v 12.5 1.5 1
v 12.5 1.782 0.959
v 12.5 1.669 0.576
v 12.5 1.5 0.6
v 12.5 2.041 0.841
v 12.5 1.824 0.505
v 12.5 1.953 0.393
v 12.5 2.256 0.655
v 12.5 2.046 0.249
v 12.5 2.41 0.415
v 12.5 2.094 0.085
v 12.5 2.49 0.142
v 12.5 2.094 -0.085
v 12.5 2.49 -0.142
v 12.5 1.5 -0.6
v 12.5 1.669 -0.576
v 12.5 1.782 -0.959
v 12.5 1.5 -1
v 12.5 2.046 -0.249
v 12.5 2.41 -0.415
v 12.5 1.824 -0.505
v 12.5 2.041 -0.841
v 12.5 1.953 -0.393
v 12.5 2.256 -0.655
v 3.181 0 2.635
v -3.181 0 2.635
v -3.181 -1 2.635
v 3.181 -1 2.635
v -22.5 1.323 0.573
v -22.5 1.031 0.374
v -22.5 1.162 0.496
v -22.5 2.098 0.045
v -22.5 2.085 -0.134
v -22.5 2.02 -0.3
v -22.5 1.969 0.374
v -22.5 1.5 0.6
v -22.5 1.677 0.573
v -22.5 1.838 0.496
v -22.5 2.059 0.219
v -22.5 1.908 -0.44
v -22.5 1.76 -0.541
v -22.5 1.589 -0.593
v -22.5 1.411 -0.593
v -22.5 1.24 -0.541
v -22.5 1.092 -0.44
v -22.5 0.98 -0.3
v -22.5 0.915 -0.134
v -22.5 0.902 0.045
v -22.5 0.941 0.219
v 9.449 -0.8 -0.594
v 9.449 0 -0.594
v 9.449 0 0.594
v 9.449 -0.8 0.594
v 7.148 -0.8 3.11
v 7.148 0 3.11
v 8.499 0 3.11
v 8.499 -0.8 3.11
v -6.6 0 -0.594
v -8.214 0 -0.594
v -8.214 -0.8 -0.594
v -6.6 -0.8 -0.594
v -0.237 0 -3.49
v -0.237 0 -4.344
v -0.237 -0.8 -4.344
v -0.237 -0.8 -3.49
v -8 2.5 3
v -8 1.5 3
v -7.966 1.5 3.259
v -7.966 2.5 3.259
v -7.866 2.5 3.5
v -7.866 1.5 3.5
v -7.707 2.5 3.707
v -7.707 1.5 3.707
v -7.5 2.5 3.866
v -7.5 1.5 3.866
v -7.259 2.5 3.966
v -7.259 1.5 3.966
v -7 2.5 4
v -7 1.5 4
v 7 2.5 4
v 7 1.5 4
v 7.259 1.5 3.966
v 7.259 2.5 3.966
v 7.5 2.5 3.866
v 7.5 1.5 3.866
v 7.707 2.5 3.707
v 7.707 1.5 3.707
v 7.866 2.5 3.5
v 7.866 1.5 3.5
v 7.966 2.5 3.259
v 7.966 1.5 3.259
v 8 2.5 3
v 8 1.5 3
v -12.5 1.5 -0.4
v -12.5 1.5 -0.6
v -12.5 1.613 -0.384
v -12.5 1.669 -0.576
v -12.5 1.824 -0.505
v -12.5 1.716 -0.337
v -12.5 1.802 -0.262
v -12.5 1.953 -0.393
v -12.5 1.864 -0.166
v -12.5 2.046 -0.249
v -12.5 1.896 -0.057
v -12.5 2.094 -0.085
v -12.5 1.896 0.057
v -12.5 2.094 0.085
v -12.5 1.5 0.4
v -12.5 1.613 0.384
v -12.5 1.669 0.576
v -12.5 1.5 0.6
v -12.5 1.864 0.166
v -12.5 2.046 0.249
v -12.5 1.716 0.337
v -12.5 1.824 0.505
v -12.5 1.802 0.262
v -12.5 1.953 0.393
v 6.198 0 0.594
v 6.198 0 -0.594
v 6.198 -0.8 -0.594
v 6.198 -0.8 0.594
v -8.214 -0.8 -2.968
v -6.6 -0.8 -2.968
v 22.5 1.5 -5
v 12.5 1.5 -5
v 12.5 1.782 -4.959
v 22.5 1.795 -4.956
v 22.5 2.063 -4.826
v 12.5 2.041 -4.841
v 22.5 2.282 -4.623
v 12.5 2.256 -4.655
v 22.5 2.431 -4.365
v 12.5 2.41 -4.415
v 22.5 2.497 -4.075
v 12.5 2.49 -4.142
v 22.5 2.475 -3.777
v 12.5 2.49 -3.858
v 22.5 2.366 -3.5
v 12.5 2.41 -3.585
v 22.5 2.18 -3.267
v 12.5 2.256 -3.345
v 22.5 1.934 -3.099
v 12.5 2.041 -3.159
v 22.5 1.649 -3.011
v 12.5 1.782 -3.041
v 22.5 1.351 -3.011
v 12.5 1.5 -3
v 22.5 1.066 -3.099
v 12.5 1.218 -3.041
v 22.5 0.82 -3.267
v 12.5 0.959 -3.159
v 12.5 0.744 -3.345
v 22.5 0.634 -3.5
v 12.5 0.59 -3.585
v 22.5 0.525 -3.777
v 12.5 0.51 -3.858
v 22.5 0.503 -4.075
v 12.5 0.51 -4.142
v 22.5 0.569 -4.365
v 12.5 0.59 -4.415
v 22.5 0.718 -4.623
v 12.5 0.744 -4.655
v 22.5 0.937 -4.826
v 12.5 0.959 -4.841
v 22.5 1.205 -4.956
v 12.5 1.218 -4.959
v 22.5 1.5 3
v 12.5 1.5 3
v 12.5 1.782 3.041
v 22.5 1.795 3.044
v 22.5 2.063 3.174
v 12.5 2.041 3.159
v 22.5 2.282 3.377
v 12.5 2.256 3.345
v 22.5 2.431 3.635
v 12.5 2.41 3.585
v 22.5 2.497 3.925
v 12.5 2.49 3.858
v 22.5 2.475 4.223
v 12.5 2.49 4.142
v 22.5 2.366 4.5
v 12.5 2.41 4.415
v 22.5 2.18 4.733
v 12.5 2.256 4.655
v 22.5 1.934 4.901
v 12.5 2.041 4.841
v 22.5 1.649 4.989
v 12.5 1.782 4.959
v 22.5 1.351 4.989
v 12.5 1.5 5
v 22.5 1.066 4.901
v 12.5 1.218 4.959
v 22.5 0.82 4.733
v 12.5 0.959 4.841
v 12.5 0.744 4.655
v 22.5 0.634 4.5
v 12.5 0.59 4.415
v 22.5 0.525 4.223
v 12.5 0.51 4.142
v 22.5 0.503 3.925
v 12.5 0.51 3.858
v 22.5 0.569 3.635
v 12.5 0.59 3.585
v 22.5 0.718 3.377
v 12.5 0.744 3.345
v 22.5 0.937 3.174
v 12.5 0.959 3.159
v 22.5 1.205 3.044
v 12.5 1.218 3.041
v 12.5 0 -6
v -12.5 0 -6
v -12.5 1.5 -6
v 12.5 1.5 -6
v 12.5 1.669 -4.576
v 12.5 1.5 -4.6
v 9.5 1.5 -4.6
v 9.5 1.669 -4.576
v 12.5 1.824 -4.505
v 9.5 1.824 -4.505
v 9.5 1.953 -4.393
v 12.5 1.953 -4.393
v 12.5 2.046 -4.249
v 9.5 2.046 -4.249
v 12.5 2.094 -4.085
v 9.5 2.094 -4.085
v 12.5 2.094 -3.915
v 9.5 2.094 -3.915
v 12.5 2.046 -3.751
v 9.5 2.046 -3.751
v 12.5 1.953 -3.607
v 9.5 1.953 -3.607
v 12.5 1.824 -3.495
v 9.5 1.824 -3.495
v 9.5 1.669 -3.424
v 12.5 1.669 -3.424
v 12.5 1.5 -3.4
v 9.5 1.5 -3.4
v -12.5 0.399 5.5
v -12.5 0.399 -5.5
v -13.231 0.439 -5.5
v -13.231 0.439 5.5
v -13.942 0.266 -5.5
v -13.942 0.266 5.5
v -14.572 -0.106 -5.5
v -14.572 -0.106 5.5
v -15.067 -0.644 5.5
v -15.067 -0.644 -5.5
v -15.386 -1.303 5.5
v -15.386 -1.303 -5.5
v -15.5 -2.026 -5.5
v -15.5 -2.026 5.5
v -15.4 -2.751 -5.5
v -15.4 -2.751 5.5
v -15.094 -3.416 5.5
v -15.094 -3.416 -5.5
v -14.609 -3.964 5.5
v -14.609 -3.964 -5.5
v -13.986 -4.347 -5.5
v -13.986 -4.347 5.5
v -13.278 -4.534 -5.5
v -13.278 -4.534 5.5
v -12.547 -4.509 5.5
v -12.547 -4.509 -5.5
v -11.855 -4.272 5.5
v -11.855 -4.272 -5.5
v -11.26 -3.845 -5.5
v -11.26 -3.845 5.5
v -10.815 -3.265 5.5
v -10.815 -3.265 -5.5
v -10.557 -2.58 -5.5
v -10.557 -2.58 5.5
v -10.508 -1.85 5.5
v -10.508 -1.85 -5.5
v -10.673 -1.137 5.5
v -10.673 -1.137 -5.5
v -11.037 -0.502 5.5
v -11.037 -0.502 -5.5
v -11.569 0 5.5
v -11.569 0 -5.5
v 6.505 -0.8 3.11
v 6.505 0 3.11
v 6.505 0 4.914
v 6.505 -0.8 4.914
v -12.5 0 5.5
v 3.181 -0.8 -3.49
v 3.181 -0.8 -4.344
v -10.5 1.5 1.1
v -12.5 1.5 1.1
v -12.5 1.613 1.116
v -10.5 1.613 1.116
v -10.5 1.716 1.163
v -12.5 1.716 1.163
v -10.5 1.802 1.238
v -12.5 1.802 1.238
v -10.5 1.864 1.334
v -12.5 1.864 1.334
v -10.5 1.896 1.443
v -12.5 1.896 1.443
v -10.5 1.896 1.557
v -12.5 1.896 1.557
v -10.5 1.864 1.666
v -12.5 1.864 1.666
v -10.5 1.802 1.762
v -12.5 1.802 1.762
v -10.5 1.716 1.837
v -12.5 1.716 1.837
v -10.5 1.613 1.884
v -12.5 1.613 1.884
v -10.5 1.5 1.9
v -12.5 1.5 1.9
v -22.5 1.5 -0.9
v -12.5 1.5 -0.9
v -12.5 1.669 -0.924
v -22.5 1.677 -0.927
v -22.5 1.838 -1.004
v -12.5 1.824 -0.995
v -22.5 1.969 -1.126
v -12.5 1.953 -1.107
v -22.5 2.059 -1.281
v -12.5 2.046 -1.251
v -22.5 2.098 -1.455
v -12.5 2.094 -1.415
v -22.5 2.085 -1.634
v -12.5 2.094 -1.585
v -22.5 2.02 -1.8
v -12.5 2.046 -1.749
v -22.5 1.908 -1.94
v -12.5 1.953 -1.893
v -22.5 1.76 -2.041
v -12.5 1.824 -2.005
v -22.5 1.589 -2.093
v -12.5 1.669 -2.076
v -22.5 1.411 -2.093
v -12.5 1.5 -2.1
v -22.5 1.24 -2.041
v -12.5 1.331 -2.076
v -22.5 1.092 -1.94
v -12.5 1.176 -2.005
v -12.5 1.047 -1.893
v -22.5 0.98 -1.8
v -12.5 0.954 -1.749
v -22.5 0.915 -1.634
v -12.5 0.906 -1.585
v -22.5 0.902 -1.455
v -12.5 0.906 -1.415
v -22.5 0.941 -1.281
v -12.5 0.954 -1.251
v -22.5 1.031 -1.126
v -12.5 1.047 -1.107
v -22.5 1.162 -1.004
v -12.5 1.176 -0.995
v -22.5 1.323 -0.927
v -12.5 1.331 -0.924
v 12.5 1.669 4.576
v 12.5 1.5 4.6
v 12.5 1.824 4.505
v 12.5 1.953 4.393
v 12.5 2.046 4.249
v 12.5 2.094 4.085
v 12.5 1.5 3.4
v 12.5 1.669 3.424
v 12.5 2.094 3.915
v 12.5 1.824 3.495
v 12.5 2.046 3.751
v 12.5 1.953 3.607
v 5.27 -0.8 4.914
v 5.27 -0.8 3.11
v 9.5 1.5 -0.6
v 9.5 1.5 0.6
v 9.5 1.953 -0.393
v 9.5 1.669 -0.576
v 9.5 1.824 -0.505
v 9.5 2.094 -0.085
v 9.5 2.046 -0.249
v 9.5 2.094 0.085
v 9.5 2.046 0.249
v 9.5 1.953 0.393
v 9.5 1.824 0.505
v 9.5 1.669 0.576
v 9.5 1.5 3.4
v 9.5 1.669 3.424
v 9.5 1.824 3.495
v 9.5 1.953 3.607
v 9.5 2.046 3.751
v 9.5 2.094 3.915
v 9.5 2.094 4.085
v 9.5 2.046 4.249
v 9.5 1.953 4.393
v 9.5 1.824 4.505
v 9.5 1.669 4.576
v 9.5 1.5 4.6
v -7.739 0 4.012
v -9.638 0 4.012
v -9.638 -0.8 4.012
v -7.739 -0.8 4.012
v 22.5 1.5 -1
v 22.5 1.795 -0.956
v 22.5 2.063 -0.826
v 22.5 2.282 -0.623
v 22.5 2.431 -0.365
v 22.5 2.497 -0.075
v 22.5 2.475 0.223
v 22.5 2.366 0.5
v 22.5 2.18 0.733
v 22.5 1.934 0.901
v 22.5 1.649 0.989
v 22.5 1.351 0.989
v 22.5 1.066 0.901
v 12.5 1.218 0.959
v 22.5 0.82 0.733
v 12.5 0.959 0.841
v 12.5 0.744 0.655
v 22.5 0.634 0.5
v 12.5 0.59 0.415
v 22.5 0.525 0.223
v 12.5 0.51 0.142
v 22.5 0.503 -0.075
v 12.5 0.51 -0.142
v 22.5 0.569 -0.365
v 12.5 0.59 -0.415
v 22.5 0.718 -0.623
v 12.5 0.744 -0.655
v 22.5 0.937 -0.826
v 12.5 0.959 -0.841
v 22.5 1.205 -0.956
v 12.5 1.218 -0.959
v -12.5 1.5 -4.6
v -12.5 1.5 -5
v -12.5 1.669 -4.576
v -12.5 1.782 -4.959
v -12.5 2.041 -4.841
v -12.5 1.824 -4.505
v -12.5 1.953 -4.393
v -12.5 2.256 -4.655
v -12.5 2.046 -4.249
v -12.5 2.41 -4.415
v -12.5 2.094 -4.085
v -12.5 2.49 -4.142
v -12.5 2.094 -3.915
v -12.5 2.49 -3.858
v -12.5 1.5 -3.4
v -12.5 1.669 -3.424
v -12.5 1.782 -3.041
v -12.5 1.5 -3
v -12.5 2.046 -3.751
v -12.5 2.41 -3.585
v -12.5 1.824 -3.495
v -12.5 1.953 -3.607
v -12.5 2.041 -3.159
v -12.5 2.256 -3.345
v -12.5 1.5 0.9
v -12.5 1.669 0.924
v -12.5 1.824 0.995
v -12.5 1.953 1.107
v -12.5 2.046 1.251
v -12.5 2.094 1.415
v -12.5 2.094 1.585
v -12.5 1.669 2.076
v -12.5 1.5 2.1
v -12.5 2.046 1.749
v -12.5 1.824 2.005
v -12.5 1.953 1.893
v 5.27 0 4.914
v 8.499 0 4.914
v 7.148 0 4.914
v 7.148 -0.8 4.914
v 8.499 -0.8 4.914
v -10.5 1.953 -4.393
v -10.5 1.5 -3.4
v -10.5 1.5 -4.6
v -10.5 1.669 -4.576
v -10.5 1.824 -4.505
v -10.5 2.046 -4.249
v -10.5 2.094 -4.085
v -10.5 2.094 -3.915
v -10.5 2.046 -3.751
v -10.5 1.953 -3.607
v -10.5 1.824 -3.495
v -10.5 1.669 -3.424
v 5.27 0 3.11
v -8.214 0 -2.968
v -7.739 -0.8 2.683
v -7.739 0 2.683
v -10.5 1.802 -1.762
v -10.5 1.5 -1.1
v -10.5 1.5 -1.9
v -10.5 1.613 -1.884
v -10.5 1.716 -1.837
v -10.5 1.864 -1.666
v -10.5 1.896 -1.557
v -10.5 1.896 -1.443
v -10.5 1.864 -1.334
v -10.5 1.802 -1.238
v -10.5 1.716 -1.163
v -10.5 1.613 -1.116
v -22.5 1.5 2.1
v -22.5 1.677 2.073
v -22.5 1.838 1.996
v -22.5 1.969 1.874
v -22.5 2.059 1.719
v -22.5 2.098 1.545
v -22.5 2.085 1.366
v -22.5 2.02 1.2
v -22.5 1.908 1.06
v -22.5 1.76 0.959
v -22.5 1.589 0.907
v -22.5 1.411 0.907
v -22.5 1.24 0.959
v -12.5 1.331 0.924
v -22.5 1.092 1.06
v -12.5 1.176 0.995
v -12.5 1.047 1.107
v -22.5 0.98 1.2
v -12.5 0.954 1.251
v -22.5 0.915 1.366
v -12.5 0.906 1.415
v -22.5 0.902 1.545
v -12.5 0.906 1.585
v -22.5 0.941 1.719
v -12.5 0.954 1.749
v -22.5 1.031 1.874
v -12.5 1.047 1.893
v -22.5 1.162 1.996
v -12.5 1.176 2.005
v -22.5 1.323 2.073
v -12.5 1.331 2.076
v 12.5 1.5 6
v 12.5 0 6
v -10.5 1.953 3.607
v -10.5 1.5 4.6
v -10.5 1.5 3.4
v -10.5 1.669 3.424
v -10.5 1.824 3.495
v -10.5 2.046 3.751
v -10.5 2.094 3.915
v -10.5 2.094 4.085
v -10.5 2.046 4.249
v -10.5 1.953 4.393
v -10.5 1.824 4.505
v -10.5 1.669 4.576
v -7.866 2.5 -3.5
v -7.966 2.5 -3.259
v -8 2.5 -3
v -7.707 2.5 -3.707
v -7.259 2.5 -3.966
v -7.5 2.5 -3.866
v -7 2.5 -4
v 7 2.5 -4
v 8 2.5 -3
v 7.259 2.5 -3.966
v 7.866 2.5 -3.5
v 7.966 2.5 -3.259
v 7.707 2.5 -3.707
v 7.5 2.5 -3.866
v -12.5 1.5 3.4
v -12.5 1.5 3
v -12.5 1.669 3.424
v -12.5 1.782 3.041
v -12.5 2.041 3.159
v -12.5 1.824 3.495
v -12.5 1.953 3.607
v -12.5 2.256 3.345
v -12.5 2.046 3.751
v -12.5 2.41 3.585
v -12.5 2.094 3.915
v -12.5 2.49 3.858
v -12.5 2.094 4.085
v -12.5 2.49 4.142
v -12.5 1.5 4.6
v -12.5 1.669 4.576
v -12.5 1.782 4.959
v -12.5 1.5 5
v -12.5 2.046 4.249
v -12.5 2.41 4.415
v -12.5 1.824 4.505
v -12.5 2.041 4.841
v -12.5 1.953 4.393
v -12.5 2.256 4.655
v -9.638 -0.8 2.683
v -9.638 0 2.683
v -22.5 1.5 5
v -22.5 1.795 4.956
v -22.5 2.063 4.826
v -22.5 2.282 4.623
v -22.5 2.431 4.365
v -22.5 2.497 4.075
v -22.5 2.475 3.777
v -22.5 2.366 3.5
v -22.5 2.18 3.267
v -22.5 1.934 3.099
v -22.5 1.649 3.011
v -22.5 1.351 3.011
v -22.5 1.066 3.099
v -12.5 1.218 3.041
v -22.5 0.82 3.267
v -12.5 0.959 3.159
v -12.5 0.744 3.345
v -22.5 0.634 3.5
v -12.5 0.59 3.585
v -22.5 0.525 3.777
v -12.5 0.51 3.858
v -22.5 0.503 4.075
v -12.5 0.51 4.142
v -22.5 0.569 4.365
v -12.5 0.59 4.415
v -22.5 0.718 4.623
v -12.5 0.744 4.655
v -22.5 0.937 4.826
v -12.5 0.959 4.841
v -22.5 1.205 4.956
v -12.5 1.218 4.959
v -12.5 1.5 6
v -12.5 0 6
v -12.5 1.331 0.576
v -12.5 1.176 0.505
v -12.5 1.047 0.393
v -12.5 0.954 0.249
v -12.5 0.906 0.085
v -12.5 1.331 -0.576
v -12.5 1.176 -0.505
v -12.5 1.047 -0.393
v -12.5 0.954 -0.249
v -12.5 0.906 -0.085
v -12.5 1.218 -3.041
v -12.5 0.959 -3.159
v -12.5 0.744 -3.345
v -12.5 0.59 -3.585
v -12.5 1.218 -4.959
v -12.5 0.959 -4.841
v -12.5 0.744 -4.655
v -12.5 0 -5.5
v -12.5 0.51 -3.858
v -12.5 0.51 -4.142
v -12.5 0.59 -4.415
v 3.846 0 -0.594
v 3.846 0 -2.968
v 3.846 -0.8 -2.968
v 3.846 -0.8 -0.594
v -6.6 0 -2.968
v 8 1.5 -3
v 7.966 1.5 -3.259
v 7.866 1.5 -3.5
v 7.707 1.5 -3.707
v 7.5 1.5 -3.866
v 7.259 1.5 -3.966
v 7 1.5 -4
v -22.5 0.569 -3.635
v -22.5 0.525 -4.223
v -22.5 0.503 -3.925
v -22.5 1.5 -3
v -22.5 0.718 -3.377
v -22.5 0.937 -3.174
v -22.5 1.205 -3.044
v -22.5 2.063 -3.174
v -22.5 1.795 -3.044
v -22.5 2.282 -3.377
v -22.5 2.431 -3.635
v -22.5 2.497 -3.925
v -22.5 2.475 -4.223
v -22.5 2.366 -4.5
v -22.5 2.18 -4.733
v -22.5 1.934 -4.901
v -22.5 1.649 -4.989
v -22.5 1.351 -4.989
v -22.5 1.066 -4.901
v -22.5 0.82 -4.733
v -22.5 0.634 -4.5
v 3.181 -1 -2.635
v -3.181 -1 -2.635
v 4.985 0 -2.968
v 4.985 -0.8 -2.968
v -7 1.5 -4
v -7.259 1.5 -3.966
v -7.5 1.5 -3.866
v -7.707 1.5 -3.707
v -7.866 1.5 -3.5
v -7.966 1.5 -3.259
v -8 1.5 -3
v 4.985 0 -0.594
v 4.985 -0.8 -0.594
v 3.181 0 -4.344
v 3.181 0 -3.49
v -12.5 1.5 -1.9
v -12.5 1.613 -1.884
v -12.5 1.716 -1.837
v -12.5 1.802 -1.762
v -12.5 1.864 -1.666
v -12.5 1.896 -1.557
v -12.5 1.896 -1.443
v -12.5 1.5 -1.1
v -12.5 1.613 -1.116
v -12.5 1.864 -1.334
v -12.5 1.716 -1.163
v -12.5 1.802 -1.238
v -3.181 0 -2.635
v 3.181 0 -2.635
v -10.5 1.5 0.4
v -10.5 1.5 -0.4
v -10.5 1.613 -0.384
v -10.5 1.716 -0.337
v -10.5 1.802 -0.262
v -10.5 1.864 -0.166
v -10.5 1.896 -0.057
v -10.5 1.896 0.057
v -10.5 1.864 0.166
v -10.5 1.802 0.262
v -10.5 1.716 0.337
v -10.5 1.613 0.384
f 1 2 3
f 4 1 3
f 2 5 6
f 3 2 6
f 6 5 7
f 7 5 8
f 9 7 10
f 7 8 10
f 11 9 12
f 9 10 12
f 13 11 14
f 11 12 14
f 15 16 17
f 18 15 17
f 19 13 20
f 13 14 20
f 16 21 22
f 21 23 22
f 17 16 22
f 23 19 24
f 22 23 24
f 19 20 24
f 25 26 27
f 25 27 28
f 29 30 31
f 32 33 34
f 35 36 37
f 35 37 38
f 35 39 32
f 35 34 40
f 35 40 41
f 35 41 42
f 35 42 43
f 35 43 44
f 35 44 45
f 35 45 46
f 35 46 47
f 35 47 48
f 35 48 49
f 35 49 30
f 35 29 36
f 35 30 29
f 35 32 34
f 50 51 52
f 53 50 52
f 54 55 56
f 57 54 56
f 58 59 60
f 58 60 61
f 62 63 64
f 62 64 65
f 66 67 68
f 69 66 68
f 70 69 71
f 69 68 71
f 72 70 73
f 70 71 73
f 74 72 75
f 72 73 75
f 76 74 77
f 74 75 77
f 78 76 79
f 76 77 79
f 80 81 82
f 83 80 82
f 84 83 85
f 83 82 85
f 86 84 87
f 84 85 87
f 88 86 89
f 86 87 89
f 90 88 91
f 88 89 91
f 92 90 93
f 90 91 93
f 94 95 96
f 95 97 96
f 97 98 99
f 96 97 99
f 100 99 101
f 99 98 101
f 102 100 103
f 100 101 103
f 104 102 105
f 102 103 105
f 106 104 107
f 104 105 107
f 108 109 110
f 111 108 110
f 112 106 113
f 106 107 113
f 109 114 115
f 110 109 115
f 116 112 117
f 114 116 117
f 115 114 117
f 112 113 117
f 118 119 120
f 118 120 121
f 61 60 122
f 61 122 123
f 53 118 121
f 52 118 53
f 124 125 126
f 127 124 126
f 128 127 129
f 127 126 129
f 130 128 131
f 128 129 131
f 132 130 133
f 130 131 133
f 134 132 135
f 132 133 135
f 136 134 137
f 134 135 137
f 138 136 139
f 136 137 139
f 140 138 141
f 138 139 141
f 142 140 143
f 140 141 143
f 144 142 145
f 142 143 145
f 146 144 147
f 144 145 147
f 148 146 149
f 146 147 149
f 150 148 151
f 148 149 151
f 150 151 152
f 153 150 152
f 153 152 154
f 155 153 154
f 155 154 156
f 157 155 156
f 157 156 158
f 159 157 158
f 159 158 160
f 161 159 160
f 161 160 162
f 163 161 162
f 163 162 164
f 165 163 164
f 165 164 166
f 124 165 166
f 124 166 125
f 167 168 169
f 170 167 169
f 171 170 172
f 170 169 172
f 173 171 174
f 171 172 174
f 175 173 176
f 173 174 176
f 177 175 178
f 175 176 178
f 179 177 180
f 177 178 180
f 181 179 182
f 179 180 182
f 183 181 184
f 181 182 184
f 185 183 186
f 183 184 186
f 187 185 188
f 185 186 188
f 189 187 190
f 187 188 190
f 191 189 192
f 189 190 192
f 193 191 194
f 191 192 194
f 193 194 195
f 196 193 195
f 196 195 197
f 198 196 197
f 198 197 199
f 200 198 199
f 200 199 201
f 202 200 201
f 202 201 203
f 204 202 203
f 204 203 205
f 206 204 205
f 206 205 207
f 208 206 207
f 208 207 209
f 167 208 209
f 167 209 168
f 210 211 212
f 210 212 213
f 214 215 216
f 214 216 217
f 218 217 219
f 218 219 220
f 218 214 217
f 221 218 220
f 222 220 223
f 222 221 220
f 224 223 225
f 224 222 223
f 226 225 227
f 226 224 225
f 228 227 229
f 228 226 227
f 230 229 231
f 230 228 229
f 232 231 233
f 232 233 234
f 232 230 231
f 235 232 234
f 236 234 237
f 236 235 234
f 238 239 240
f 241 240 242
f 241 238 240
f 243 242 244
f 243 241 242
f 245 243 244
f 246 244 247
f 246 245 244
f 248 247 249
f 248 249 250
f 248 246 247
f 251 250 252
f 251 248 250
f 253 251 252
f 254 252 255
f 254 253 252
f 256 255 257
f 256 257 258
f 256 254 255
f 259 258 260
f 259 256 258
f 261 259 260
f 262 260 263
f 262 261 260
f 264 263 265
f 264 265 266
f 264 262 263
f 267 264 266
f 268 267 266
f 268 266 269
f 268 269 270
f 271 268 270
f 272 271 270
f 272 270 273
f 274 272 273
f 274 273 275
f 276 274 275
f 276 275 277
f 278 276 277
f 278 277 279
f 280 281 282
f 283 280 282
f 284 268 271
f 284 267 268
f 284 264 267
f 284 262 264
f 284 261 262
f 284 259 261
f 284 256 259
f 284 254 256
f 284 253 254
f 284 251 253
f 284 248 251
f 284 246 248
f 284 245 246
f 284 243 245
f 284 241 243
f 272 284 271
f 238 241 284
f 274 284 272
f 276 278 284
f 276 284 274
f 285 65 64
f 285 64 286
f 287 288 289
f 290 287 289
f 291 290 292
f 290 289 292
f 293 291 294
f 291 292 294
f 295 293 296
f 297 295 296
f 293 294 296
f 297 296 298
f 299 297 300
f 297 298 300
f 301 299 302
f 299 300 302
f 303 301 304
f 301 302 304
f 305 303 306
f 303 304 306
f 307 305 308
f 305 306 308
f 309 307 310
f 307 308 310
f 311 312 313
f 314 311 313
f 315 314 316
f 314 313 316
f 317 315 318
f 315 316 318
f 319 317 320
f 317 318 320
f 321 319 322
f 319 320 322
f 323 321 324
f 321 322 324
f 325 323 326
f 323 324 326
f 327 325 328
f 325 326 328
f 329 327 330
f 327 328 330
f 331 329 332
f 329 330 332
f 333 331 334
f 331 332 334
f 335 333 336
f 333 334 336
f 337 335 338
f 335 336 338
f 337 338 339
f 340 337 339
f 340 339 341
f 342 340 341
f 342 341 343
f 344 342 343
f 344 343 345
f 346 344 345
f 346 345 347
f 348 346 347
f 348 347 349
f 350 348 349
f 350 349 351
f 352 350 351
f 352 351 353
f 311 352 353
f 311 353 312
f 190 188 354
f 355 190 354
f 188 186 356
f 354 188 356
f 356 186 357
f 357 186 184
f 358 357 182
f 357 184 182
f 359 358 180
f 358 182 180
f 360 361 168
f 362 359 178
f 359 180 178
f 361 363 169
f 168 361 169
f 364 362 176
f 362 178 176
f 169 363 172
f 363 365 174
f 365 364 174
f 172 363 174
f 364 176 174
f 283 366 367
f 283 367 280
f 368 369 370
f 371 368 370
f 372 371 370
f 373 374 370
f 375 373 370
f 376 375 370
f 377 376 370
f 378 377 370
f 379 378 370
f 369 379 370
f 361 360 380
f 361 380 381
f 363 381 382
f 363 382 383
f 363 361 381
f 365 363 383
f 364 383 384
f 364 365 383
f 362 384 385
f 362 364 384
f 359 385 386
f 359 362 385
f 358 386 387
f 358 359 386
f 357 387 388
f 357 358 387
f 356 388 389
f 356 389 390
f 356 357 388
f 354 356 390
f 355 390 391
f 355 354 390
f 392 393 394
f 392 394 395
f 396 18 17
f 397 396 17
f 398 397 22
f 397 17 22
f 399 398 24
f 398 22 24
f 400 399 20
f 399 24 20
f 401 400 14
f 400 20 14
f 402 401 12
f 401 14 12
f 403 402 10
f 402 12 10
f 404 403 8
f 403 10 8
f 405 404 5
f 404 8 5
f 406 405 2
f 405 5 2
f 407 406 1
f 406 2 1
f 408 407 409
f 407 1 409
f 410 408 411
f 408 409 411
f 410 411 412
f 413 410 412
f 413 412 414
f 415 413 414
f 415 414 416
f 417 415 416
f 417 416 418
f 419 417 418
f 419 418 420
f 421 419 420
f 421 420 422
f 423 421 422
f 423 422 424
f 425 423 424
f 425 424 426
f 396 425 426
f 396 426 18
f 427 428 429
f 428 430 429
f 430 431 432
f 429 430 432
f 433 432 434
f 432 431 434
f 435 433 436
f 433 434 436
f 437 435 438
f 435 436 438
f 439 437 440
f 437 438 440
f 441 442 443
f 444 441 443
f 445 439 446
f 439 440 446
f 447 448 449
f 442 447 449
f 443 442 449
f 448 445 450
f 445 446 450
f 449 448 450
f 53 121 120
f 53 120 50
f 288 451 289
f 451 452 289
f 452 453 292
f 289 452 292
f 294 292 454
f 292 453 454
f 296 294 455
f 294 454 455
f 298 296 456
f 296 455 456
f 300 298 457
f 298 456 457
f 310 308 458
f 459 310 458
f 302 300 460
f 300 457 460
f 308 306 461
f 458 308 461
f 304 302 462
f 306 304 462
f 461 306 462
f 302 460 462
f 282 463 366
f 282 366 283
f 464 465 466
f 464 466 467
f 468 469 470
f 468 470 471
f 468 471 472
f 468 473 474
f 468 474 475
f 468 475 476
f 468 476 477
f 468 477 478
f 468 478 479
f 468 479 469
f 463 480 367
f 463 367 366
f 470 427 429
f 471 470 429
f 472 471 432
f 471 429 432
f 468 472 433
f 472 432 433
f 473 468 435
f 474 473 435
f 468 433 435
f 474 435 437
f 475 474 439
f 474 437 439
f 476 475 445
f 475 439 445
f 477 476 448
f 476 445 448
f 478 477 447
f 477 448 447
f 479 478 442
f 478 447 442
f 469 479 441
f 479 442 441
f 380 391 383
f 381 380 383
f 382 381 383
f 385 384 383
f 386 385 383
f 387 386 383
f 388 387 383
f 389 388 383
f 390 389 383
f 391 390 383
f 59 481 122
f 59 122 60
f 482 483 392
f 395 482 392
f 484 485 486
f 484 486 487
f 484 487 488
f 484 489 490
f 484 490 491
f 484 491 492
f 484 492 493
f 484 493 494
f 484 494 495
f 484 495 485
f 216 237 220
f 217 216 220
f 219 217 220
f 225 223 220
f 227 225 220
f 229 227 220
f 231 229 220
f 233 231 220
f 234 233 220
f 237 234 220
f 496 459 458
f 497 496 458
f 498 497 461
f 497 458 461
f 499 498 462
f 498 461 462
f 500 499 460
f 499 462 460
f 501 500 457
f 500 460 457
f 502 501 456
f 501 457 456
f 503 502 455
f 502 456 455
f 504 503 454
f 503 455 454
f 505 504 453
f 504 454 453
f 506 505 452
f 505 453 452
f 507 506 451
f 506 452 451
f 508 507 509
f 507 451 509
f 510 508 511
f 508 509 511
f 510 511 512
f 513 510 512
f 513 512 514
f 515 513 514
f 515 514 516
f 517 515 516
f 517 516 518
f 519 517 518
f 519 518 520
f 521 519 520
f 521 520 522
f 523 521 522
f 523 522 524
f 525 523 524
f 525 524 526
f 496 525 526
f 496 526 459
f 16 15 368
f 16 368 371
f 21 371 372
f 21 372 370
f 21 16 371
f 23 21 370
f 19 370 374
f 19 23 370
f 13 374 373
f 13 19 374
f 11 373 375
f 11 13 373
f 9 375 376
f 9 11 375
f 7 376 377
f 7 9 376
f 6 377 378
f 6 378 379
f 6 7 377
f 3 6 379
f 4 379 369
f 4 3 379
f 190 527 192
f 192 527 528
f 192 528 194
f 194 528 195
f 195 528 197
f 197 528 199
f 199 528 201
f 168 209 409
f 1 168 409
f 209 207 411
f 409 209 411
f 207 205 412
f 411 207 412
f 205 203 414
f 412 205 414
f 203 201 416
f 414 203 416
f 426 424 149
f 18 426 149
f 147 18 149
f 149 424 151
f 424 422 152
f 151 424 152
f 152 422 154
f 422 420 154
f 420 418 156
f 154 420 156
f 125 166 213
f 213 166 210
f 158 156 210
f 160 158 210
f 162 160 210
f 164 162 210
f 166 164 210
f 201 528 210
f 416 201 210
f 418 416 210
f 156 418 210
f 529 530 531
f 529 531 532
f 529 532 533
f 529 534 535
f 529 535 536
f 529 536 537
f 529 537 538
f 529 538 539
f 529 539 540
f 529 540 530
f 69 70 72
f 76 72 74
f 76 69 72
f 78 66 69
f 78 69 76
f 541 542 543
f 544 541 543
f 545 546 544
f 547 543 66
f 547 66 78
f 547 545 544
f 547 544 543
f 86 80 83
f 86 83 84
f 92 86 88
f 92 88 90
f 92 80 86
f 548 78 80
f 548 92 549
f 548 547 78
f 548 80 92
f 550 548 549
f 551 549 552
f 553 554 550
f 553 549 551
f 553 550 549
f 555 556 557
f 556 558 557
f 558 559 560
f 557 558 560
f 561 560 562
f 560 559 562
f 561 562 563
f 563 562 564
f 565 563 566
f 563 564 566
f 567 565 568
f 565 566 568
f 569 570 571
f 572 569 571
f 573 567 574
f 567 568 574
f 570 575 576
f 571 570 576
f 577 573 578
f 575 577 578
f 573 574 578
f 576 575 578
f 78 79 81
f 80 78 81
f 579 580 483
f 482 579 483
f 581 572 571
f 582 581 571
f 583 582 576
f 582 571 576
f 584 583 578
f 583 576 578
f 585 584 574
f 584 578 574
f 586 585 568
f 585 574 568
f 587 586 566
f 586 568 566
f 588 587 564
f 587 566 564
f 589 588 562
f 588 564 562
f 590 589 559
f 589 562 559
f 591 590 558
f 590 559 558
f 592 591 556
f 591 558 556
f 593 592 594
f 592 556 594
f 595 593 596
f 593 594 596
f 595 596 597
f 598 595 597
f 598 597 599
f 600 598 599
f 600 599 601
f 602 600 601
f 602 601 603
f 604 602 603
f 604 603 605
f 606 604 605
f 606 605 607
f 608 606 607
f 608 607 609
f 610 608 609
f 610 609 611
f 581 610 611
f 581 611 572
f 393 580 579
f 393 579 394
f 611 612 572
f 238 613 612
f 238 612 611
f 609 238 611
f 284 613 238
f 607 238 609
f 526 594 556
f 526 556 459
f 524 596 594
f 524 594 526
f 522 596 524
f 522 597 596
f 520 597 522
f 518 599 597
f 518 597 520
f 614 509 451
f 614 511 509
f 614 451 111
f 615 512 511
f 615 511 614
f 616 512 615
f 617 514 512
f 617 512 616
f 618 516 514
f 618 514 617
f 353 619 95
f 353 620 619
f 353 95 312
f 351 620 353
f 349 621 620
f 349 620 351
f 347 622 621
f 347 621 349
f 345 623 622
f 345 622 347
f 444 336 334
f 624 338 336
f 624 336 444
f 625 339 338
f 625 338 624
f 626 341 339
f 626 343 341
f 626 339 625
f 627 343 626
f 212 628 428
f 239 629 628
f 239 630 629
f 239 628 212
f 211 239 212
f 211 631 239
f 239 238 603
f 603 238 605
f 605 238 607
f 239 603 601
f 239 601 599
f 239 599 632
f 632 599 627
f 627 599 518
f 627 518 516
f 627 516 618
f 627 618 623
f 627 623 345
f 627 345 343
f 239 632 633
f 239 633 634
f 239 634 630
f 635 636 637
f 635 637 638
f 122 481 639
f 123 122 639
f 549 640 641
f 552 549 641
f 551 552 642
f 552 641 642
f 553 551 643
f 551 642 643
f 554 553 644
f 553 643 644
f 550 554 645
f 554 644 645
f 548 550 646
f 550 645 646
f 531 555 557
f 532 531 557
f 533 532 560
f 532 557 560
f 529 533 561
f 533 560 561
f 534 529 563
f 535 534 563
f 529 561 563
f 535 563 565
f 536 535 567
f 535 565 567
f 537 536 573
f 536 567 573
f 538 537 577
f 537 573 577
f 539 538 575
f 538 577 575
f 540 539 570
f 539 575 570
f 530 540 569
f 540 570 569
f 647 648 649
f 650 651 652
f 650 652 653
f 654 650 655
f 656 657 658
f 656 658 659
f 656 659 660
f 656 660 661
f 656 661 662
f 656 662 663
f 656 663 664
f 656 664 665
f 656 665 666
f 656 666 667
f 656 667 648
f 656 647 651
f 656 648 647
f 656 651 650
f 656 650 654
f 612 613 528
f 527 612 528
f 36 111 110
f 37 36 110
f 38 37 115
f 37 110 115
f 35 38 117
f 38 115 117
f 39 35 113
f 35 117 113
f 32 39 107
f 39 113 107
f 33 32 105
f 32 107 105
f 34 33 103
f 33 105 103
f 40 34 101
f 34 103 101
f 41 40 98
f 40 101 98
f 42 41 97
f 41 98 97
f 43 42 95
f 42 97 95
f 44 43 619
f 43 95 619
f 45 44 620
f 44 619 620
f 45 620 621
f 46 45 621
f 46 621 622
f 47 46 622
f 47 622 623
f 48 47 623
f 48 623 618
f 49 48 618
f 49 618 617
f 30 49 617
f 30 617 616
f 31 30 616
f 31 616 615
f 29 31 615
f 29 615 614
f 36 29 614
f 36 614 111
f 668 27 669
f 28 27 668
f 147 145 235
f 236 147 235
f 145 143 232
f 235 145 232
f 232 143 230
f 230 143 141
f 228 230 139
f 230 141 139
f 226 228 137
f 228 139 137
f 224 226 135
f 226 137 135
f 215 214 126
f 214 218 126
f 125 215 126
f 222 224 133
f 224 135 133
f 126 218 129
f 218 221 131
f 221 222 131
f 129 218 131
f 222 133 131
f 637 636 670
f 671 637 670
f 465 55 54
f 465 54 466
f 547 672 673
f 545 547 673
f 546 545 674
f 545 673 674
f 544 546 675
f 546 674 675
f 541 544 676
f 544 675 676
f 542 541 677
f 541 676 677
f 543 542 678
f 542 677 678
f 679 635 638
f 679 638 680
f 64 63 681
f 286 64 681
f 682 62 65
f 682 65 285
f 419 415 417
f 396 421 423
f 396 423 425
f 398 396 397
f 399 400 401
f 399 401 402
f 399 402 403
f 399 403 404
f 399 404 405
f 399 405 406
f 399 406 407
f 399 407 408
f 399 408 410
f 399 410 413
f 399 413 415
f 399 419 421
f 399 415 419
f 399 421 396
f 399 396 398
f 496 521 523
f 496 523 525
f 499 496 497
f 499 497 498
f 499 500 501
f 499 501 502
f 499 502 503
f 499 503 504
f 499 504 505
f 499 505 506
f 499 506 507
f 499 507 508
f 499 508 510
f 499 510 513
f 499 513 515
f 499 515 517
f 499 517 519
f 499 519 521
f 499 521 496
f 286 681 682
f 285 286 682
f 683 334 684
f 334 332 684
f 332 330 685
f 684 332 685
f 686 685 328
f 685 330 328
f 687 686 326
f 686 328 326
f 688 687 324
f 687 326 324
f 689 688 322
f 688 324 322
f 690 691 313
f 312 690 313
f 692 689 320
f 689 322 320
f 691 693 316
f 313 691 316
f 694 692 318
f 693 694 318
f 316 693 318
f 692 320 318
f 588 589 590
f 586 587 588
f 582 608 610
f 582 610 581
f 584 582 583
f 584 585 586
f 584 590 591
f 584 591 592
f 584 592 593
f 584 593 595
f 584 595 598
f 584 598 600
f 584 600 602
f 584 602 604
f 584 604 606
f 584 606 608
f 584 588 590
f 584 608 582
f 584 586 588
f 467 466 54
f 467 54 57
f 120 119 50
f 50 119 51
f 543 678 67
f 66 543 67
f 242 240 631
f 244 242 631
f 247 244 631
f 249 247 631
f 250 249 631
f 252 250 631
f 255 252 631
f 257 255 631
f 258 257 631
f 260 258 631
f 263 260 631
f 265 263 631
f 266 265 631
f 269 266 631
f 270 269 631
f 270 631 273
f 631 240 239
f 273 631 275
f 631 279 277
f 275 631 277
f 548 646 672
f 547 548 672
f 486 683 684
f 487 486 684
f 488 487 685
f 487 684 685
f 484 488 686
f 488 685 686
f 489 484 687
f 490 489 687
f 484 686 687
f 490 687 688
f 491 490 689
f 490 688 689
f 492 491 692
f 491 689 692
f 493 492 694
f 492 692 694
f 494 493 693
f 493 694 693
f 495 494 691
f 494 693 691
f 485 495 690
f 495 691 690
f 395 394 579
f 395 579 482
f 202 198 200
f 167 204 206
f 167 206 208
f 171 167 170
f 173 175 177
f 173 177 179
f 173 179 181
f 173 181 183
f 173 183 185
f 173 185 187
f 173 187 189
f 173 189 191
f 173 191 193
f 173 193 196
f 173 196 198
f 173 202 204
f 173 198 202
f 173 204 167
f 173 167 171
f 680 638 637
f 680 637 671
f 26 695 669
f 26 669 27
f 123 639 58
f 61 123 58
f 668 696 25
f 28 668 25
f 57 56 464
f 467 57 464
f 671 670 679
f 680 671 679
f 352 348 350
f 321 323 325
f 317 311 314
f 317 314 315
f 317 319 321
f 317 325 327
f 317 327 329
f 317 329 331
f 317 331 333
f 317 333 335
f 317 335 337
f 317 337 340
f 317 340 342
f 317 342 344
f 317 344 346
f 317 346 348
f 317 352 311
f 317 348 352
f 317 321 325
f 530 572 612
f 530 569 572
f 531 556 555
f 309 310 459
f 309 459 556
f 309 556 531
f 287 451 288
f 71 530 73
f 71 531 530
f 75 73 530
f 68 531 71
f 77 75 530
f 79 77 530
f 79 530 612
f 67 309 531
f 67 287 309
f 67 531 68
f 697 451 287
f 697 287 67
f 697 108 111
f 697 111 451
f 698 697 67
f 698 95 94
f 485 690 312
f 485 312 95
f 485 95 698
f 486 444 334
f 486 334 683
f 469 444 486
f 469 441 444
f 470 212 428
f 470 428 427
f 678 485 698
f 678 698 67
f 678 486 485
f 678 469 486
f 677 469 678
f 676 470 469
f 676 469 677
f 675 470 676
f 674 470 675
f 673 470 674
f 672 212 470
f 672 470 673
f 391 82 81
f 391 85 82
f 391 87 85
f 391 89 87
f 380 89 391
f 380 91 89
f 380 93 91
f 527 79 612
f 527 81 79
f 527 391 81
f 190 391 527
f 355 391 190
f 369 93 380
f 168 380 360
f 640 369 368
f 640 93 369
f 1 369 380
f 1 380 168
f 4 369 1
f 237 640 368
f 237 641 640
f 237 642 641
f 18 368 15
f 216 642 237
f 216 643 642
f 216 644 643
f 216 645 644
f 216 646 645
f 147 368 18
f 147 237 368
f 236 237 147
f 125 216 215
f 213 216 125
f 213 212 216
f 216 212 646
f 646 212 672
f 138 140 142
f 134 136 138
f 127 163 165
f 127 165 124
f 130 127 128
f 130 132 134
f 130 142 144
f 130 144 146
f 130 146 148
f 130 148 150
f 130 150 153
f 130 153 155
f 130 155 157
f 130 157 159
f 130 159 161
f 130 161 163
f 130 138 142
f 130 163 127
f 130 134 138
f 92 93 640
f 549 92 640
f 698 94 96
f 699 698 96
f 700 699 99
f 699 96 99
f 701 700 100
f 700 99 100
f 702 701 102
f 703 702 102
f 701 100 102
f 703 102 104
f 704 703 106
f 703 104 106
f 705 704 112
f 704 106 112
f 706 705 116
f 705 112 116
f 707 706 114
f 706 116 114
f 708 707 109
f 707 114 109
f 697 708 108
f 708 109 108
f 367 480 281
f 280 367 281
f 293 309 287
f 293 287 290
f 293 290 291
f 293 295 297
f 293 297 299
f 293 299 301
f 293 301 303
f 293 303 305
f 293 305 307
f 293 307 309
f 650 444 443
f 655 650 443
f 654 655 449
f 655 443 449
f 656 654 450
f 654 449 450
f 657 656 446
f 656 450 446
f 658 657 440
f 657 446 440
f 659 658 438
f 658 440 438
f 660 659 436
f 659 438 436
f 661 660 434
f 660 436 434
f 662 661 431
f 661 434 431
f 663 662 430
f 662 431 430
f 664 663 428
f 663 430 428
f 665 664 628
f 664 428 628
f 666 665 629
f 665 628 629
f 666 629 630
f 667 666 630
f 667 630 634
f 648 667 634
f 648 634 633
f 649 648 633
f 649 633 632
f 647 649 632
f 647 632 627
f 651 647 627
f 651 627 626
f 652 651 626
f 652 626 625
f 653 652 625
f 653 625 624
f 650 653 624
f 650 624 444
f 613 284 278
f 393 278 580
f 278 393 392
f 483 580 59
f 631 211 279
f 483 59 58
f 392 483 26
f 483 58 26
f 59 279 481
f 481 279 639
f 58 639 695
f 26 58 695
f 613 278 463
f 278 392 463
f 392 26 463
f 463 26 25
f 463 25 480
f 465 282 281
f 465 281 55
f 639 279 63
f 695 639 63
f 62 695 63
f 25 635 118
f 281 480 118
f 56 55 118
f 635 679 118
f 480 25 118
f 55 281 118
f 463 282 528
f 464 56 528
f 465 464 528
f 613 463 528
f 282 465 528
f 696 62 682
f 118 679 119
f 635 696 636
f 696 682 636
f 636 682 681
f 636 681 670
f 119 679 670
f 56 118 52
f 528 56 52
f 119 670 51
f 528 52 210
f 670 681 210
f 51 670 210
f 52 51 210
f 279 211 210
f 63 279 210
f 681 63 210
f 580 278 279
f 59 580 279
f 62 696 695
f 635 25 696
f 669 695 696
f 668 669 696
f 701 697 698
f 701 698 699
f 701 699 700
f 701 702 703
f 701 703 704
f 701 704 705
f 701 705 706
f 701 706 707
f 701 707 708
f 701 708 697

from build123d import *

# Parameters (mm, degrees)
SKETCH1_W            = 25
SKETCH1_H            = 12
BOSS_EXTRUDE1_DEPTH  = 1.5
SKETCH2_R            = 1
BOSS_EXTRUDE2_DEPTH  = 10
SKETCH3_R            = 0.6
BOSS_EXTRUDE3_DEPTH  = 3
SKETCH4_R            = 1
SKETCH4_R_2          = 0.6
BOSS_EXTRUDE4_DEPTH  = 10
SKETCH5_R            = 0.6
SKETCH5_R_2          = 0.4
BOSS_EXTRUDE5_DEPTH  = 2
BOSS_EXTRUDE6_DEPTH  = 1
SKETCH8_R            = 2.5
BOSS_EXTRUDE10_DEPTH = 11
SKETCH9_W            = 6.362334076
SKETCH9_H            = 5.27029166
BOSS_EXTRUDE11_DEPTH = 1
SKETCH10_W           = 1.899204201
SKETCH10_H           = 1.329442941
SKETCH10_W_2         = 1.614323571
SKETCH10_H_2         = 2.374005252
SKETCH10_W_3         = 3.418567563
SKETCH10_H_3         = 0.85464189
SKETCH10_W_4         = 1.139522521
SKETCH10_W_5         = 1.234482731
SKETCH10_H_4         = 1.804243992
SKETCH10_W_6         = 1.351356835
SKETCH10_W_7         = 3.250561037
SKETCH10_H_5         = 1.187002626
BOSS_EXTRUDE12_DEPTH = 0.8


with BuildPart() as part:
    # Sketch1 → Boss-Extrude1 (new body)
    with BuildSketch(Plane(origin=(0, 0, 0), x_dir=(1, 0, 0), z_dir=(0, 1, 0))):
        Rectangle(SKETCH1_W, SKETCH1_H)
    extrude(amount=BOSS_EXTRUDE1_DEPTH)

    # Sketch2 → Boss-Extrude2 (add)
    with BuildSketch(Plane(origin=(12.5, 0, 0), x_dir=(0, 0, -1), z_dir=(1, 0, 0))):
        with Locations((0, 1.5)):
            Circle(SKETCH2_R)
        with Locations((-4, 1.5)):
            Circle(SKETCH2_R)
        with Locations((4, 1.5)):
            Circle(SKETCH2_R)
    extrude(amount=BOSS_EXTRUDE2_DEPTH)

    # Sketch3 → Boss-Extrude3 (add)
    with BuildSketch(Plane(origin=(12.5, 0, 0), x_dir=(0, 0, -1), z_dir=(1, 0, 0))):
        with Locations((-4, 1.5)):
            Circle(SKETCH3_R)
        with Locations((0, 1.5)):
            Circle(SKETCH3_R)
        with Locations((4, 1.5)):
            Circle(SKETCH3_R)
    extrude(amount=-BOSS_EXTRUDE3_DEPTH)

    # Sketch4 → Boss-Extrude4 (add)
    with BuildSketch(Plane.ZY.offset(12.5)):
        with Locations((-4, 1.5)):
            Circle(SKETCH4_R)
        with Locations((4, 1.5)):
            Circle(SKETCH4_R)
        with Locations((0, 1.5)):
            Circle(SKETCH4_R_2)
        with Locations((1.5, 1.5)):
            Circle(SKETCH4_R_2)
        with Locations((-1.5, 1.5)):
            Circle(SKETCH4_R_2)
    extrude(amount=BOSS_EXTRUDE4_DEPTH)

    # Sketch5 → Boss-Extrude5 (add)
    with BuildSketch(Plane(origin=(-12.5, 0, 0), x_dir=(0, 0, -1), z_dir=(1, 0, 0))):
        with Locations((-4, 1.5)):
            Circle(SKETCH5_R)
        with Locations((-1.5, 1.5)):
            Circle(SKETCH5_R_2)
        with Locations((0, 1.5)):
            Circle(SKETCH5_R_2)
        with Locations((1.5, 1.5)):
            Circle(SKETCH5_R_2)
        with Locations((4, 1.5)):
            Circle(SKETCH5_R)
    extrude(amount=BOSS_EXTRUDE5_DEPTH)

    # Sketch6 → Boss-Extrude6 (add)
    with BuildSketch(Plane(origin=(0, 1.5, 0), x_dir=(1, 0, 0), z_dir=(0, 1, 0))):
        with BuildLine():
            Line((-7, -4), (7, -4))
            ThreePointArc((7, -4), (7.707106781, -3.707106781), (8, -3))
            Line((8, -3), (8, 3))
            ThreePointArc((8, 3), (7.707106781, 3.707106781), (7, 4))
            Line((7, 4), (-7, 4))
            ThreePointArc((-7, 4), (-7.707106781, 3.707106781), (-8, 3))
            Line((-8, 3), (-8, -3))
            ThreePointArc((-8, -3), (-7.707106781, -3.707106781), (-7, -4))
        make_face()
    extrude(amount=BOSS_EXTRUDE6_DEPTH)

    # Sketch8 → Boss-Extrude10 (add)
    with BuildSketch(Plane.XY.offset(5.5)):
        with Locations((-13, -2.05)):
            Circle(SKETCH8_R)
    extrude(amount=-BOSS_EXTRUDE10_DEPTH)

    # Sketch9 → Boss-Extrude11 (add)
    with BuildSketch(Plane.XZ):
        Rectangle(SKETCH9_W, SKETCH9_H)
    extrude(amount=BOSS_EXTRUDE11_DEPTH)

    # Sketch10 → Boss-Extrude12 (add)
    with BuildSketch(Plane.XZ):
        with Locations((-8.688859223, 3.347347405)):
            Rectangle(SKETCH10_W, SKETCH10_H)
        with Locations((-7.406896386, -1.780503939)):
            Rectangle(SKETCH10_W_2, SKETCH10_H_2)
        with Locations((1.471883257, -3.917108666)):
            Rectangle(SKETCH10_W_3, SKETCH10_H_3)
        with Locations((4.415649769, -1.780503939)):
            Rectangle(SKETCH10_W_4, SKETCH10_H_2)
        with Locations((5.887533026, 4.012068876)):
            Rectangle(SKETCH10_W_5, SKETCH10_H_4)
        with Locations((7.823260385, 4.012068876)):
            Rectangle(SKETCH10_W_6, SKETCH10_H_4)
        with Locations((7.823260385, 0)):
            Rectangle(SKETCH10_W_7, SKETCH10_H_5)
    extrude(amount=BOSS_EXTRUDE12_DEPTH)


solid = part.part
